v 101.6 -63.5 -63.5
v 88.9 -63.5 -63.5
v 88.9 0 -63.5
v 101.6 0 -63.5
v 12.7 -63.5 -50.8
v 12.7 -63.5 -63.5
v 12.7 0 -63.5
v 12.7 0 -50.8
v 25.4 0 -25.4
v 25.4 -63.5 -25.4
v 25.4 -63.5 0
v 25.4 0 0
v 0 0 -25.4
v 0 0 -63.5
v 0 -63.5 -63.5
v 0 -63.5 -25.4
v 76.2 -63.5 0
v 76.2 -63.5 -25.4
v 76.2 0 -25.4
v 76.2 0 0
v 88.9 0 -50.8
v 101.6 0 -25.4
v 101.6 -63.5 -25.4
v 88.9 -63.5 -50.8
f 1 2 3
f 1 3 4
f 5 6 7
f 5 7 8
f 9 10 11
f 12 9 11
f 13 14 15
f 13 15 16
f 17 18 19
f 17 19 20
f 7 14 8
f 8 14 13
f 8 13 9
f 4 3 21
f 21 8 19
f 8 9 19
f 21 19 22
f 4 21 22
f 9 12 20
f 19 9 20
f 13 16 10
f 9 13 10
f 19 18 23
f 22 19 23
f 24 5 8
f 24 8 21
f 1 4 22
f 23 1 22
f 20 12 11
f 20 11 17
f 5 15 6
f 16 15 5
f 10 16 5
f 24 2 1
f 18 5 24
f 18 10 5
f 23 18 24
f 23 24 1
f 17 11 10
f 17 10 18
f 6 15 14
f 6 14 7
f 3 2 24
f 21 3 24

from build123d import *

# Parameters (mm, degrees)
F0_W     = 101.6
F0_H     = 63.5
F1_DEPTH = 63.5
F2_W     = 76.2
F2_H     = 12.7
F3_DEPTH = 63.5
F4_W     = 25.4
F4_H     = 25.4
F5_DEPTH = 63.5
F6_W     = 25.4
F6_H     = 25.4
F7_DEPTH = 63.5


with BuildPart() as f1:
    # F0 (on Front) → F1 (new body)
    with BuildSketch(Plane.XZ):
        with Locations((50.8, -31.75)):
            Rectangle(F0_W, F0_H)
    extrude(amount=F1_DEPTH)

    # F2 (on face) → F3 (cut)
    with BuildSketch(Plane.XZ.offset(63.5)):
        with Locations((50.8, -57.15)):
            Rectangle(F2_W, F2_H)
    extrude(amount=-F3_DEPTH, mode=Mode.SUBTRACT)

    # F4 (on face) → F5 (cut)
    with BuildSketch(Plane.XZ.offset(63.5)):
        with Locations((88.9, -12.7)):
            Rectangle(F4_W, F4_H)
    extrude(amount=-F5_DEPTH, mode=Mode.SUBTRACT)

    # F6 (on face) → F7 (cut)
    with BuildSketch(Plane.XZ.offset(63.5)):
        with Locations((12.7, -12.7)):
            Rectangle(F6_W, F6_H)
    extrude(amount=-F7_DEPTH, mode=Mode.SUBTRACT)


solid = f1.part
